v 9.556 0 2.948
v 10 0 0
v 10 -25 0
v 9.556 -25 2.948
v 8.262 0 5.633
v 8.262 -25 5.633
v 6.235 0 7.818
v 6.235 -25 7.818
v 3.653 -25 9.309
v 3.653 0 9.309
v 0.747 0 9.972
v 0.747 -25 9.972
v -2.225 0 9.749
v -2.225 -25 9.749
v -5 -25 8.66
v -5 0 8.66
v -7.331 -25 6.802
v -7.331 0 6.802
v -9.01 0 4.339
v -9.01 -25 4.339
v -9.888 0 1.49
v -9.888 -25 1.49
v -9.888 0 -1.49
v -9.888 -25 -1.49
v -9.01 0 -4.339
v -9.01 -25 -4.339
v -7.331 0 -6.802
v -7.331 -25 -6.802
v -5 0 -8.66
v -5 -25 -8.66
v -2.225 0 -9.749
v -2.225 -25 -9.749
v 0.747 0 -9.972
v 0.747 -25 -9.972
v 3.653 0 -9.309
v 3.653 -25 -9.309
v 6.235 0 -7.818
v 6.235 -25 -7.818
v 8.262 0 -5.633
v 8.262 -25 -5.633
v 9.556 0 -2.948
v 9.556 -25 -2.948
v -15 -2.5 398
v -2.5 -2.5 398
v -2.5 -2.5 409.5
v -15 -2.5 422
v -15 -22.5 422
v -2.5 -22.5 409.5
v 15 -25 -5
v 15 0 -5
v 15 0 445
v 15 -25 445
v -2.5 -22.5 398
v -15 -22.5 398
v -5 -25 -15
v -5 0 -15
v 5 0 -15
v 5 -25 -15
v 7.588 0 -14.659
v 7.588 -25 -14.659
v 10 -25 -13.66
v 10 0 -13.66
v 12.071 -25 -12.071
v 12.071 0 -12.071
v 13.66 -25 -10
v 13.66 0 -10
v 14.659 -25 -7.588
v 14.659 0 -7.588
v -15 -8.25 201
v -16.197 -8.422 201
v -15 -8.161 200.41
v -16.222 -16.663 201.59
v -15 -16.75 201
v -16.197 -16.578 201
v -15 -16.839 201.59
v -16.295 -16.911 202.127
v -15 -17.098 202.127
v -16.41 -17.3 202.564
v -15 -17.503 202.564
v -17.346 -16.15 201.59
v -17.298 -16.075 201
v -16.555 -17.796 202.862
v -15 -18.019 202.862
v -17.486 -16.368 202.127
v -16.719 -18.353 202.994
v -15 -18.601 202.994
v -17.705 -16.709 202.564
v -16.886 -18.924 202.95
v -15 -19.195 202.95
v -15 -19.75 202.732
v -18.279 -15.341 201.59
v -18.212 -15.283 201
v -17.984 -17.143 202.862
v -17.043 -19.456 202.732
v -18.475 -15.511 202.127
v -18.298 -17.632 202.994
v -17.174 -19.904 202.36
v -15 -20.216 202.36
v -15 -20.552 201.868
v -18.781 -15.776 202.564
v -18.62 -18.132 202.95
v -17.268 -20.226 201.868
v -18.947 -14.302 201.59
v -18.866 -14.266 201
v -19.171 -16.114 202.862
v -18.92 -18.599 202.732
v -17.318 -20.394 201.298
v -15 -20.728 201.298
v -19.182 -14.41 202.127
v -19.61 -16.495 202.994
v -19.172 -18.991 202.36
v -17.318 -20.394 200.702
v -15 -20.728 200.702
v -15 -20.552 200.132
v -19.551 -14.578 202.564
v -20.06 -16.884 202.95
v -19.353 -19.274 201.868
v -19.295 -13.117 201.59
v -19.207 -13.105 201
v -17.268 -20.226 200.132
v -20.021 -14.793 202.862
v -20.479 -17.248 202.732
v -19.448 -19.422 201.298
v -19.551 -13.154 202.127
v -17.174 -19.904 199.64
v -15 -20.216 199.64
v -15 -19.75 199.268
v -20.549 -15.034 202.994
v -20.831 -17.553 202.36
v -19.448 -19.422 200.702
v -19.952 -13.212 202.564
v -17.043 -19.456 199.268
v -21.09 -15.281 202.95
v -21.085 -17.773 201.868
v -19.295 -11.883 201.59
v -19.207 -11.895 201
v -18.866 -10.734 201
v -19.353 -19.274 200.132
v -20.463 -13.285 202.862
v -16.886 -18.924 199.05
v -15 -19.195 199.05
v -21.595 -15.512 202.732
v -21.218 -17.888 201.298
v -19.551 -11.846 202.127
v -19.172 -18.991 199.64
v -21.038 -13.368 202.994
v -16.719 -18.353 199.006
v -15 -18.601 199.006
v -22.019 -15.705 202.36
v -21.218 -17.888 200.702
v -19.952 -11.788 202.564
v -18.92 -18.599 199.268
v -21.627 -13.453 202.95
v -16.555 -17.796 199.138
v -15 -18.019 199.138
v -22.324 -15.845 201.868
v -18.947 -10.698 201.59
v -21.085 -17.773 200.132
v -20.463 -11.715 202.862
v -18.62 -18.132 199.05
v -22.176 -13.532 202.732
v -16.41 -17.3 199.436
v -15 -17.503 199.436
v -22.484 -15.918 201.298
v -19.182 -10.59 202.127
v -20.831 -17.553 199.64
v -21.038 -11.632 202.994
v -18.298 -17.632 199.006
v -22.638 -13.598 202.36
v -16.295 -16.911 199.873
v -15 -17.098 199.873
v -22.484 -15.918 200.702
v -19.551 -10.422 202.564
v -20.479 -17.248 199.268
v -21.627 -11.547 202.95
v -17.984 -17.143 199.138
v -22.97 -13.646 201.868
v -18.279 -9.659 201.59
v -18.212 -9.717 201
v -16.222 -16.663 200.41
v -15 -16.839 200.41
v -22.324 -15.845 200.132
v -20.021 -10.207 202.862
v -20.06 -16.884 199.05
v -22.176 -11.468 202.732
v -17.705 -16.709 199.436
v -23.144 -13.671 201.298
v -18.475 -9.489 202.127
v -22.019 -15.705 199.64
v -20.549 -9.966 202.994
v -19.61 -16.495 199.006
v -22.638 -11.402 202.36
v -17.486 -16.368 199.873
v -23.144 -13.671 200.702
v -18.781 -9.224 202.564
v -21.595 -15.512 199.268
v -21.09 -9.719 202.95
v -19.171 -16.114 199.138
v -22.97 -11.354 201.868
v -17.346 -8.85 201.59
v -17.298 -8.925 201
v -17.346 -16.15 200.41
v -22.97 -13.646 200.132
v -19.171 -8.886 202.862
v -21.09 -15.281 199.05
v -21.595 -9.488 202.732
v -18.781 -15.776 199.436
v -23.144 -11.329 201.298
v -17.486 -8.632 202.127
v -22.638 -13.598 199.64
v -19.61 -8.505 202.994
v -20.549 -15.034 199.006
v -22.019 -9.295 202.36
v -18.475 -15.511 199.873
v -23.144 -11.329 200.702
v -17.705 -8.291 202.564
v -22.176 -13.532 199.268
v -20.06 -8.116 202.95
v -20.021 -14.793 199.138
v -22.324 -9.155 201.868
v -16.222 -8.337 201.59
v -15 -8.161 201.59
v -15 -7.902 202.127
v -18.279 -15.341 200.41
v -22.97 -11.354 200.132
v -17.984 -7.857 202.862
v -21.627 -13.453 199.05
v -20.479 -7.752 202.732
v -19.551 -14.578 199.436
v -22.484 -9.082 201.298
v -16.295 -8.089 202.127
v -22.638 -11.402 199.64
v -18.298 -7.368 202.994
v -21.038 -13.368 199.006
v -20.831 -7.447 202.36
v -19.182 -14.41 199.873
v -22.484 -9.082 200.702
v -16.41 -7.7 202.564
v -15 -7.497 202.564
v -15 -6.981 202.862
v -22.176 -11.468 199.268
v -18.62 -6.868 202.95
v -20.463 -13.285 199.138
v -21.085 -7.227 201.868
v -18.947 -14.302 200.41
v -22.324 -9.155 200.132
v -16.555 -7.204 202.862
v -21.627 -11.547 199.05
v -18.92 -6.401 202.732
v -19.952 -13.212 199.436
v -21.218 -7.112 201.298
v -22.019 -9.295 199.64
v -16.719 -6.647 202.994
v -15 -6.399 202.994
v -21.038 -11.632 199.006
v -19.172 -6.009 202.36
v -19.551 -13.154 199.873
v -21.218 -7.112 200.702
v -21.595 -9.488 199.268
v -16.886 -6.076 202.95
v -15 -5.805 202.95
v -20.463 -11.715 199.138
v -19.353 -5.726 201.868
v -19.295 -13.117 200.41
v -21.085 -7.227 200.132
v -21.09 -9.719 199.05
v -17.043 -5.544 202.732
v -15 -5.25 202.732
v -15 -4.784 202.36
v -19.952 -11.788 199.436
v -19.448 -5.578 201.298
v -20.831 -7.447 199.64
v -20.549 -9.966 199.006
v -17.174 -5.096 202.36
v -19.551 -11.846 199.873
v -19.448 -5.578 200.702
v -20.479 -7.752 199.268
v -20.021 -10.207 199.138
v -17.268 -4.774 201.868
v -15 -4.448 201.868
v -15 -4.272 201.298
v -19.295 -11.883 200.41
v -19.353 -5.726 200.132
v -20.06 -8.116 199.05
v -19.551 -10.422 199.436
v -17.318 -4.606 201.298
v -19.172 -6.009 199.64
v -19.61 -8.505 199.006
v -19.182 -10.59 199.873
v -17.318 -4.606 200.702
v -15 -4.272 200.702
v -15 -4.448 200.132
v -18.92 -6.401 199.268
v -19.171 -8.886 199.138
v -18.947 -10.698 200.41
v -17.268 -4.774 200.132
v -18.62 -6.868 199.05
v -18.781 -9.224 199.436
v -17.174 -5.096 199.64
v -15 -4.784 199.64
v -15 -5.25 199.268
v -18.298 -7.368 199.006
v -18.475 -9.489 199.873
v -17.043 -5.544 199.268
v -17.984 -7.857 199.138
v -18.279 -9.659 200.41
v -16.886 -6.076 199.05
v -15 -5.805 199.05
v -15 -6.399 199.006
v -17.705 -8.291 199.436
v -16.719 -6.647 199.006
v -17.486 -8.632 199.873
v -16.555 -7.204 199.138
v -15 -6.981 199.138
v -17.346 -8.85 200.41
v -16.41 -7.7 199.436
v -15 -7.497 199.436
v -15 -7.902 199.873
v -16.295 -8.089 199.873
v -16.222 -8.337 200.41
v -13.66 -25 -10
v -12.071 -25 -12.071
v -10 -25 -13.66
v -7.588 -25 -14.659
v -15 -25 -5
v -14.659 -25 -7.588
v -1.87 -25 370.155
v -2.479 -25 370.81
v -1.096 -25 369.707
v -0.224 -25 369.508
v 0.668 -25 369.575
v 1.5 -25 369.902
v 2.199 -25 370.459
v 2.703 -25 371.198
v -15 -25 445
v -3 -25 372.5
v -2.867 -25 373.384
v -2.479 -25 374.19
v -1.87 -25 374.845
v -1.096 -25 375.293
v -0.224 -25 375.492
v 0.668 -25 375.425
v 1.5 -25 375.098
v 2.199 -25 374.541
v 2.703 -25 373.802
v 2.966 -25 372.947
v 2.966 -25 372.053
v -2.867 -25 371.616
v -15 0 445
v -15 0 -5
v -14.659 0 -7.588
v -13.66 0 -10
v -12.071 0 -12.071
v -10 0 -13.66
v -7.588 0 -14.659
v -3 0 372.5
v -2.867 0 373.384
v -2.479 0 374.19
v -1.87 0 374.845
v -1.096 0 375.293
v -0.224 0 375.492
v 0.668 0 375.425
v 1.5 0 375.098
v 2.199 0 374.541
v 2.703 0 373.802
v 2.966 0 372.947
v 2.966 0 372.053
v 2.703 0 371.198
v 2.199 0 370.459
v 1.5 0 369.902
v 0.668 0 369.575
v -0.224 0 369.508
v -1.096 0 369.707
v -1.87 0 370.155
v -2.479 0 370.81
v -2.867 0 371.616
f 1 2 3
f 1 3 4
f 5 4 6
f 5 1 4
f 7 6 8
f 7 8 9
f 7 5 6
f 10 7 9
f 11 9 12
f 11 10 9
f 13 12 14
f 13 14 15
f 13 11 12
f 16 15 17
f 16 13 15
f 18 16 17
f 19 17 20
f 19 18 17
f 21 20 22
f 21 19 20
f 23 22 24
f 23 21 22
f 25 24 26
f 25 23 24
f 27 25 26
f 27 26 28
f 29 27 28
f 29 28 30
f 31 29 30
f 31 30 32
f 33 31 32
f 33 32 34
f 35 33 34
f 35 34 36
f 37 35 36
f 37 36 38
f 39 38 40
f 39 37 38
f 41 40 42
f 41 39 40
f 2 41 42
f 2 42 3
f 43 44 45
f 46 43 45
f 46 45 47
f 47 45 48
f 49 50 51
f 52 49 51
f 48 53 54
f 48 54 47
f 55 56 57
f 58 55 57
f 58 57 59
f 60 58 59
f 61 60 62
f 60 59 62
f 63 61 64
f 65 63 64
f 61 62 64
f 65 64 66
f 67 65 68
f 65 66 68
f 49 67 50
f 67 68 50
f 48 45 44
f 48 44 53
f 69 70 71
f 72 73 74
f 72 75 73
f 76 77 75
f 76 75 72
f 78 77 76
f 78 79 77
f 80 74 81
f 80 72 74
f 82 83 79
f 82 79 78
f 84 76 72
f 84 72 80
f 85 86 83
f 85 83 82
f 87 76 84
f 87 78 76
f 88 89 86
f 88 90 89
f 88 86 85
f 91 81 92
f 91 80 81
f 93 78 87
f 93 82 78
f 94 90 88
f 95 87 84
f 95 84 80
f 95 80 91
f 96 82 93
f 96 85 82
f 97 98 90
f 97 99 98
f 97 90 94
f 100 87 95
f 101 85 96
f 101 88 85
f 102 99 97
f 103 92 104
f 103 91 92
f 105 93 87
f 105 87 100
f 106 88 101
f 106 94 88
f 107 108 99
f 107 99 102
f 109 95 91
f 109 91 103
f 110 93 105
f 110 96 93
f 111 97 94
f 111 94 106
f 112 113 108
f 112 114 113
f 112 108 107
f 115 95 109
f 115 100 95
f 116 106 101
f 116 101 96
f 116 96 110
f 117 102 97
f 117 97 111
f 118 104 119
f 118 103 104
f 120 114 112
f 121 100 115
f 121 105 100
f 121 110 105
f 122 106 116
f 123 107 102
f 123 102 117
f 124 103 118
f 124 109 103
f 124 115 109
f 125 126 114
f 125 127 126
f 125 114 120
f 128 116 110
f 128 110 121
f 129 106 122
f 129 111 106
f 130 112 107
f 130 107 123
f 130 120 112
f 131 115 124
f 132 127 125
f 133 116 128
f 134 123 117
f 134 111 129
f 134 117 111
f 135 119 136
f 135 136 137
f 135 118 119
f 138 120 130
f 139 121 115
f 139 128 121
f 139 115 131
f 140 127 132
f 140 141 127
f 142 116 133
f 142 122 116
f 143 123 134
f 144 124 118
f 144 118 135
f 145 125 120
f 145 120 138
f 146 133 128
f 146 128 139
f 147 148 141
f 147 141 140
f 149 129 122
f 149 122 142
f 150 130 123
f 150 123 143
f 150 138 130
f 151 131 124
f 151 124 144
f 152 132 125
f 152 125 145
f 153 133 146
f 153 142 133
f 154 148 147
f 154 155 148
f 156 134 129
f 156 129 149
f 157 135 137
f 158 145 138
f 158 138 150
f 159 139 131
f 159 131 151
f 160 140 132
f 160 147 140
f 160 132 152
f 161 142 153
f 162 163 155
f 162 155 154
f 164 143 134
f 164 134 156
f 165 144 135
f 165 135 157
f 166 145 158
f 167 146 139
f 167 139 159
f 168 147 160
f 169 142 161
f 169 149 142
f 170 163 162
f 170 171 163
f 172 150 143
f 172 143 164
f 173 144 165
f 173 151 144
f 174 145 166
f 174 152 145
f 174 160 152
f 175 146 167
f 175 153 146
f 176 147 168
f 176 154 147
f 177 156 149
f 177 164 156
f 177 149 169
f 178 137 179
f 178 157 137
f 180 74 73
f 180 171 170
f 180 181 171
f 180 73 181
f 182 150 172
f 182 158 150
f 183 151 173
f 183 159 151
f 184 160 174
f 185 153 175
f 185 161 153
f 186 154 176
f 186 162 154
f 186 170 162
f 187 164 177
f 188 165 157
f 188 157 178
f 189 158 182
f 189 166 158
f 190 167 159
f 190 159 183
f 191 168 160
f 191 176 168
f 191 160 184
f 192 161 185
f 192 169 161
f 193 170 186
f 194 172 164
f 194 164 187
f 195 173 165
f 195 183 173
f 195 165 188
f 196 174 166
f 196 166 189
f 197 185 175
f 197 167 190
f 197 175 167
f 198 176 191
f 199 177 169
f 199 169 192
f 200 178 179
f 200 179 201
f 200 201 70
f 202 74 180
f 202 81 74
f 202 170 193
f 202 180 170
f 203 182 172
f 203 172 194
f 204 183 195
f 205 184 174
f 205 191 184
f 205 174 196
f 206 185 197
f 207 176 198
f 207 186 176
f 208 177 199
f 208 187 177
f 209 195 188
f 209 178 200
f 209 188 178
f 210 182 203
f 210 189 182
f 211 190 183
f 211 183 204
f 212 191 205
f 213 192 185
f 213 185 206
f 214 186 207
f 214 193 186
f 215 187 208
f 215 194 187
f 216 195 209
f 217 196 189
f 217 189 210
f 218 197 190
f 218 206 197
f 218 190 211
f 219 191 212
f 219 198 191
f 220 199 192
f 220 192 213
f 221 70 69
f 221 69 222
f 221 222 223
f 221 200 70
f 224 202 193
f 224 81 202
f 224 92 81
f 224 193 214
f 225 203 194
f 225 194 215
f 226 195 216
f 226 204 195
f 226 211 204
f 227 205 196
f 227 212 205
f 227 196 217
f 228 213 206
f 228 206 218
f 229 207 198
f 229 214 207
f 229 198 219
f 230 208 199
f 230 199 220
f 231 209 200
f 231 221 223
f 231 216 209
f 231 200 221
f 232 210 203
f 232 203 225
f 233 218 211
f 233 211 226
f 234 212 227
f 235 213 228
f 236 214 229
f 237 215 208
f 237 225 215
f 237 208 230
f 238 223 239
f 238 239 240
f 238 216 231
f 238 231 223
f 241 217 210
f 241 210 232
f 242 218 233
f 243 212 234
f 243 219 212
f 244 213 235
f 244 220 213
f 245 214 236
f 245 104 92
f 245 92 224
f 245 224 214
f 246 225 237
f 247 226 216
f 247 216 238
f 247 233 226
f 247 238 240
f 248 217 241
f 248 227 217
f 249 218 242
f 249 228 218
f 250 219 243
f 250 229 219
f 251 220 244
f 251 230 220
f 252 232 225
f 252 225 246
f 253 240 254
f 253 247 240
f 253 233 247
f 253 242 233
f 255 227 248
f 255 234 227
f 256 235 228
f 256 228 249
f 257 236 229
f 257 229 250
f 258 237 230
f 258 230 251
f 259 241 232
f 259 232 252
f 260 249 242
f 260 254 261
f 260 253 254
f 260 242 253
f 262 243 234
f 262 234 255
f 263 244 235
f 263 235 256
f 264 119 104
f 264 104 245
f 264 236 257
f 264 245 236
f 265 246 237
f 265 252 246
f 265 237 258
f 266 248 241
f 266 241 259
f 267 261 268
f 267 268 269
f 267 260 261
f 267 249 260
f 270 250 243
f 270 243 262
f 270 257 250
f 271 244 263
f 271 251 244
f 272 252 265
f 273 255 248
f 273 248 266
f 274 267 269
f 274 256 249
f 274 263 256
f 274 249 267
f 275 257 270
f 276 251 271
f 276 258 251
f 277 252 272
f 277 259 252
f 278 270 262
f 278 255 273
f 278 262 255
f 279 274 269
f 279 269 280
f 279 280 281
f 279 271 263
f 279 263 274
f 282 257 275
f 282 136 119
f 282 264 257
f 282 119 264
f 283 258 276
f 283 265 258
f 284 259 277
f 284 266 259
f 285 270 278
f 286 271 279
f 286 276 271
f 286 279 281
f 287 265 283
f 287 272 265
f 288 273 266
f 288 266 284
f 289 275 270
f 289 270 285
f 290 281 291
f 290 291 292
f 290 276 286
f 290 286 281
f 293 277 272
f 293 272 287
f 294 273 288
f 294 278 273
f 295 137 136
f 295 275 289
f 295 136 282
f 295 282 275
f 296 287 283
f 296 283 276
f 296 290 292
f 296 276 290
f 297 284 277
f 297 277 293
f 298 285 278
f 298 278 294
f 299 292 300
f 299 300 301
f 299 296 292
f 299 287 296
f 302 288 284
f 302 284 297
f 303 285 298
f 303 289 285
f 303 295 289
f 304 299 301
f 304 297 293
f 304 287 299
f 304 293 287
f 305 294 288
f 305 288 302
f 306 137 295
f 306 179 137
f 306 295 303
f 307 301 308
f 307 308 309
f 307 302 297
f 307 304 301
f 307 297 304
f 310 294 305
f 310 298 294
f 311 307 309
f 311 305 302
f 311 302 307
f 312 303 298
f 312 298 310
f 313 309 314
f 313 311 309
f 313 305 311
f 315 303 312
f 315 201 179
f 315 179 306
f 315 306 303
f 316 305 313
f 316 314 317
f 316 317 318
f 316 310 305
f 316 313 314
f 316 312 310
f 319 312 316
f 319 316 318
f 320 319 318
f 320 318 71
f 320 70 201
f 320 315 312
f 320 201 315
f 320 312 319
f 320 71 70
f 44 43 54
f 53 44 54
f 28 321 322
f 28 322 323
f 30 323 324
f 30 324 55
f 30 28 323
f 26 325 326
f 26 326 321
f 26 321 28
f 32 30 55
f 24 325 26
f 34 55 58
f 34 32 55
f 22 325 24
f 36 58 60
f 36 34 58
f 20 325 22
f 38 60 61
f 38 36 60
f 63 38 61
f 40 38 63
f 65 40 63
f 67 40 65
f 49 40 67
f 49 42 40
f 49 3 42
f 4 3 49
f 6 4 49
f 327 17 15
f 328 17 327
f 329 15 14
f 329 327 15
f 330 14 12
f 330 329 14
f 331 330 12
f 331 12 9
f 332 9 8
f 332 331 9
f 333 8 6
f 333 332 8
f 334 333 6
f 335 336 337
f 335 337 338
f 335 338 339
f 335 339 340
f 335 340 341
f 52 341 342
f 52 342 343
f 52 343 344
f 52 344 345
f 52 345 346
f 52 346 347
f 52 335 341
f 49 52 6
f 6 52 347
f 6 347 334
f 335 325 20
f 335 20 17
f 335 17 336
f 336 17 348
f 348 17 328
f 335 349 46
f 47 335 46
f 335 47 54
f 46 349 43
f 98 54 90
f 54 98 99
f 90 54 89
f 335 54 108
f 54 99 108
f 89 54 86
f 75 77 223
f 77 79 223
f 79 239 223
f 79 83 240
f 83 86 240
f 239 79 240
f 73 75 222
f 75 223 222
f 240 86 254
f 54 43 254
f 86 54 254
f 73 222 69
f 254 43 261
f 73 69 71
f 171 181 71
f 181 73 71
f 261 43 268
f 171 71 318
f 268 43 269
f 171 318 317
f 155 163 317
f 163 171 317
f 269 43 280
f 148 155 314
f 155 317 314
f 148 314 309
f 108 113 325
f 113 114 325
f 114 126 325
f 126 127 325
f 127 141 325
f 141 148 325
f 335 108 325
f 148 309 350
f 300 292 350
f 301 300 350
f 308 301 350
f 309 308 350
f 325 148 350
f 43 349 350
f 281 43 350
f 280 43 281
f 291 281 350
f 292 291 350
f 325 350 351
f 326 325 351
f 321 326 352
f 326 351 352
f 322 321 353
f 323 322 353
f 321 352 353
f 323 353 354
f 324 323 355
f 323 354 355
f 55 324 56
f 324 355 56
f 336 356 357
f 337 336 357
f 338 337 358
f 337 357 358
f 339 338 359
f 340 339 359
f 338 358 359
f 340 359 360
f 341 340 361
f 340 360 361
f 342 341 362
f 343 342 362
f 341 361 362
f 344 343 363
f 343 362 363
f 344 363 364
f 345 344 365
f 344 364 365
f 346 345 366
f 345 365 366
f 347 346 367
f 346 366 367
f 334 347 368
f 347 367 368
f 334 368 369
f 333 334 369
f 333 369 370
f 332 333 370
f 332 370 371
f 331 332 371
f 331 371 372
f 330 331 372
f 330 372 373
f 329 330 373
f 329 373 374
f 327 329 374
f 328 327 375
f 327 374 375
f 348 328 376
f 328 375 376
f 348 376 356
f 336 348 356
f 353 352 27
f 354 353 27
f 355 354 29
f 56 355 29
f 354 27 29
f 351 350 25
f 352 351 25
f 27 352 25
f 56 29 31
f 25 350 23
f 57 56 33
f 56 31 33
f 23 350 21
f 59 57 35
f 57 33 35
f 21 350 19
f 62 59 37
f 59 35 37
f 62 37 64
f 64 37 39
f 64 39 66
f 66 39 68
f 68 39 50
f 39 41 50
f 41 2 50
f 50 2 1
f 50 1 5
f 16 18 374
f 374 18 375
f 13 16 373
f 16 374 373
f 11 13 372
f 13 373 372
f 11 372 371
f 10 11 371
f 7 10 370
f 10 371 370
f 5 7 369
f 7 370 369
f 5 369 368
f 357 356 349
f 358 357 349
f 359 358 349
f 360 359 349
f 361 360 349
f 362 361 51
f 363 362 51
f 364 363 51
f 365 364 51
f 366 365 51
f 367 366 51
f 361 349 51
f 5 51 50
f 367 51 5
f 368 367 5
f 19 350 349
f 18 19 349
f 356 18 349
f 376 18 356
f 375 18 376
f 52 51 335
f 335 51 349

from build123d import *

# Parameters (mm, degrees)
F0_R      = 10
F1_DEPTH  = 25
F2_W      = 20
F2_H      = 24
F3_DEPTH  = 12.5
F4_SIZE   = 12.49999
F5_R      = 2
F9_R      = 3
F10_DEPTH = 25


# Not quite as in the source:
# - a fillet or chamfer is up to 0.001 mm smaller than in the source, because OpenCascade refuses the exact size


with BuildPart() as f1:
    # F0 (on Front) → F1 (new body)
    with BuildSketch(Plane.XZ):
        with BuildLine():
            ThreePointArc((-15, -5), (-12.0710678119, -12.0710678119), (-5, -15))
            Line((-5, -15), (5, -15))
            ThreePointArc((5, -15), (12.0710678119, -12.0710678119), (15, -5))
            Line((15, -5), (15, 15))
            Line((15, 15), (15, 445))
            Line((15, 445), (-15, 445))
            Line((-15, 445), (-15, 15))
            Line((-15, 15), (-15, -5))
        make_face()
        Circle(F0_R, mode=Mode.SUBTRACT)
    extrude(amount=F1_DEPTH)

    # F2 (on face) → F3 (cut)
    with BuildSketch(Plane(origin=(-15, 0, 0), x_dir=(0, -1, 0), z_dir=(-1, 0, 0))):
        with Locations((12.5, 410)):
            Rectangle(F2_W, F2_H)
    extrude(amount=-F3_DEPTH, mode=Mode.SUBTRACT)

    # F4 (size 12.5 in the source; OpenCascade refuses exactly that, so slightly less here)
    f4_edges = [f1.edges().sort_by_distance(p)[0] for p in [
        (-2.5, -12.5, 422),
    ]]
    chamfer(f4_edges, length=F4_SIZE)

    # F8: sweep along a path in F7
    with BuildLine(Plane.XY.offset(201)) as f8_path:
        ThreePointArc((-15, -18.75), (-21.25, -12.5), (-15, -6.25))
    # F5 (on face) → F8 (sweep)
    with BuildSketch(Plane(origin=(-15, 0, 0), x_dir=(0, -1, 0), z_dir=(-1, 0, 0))):
        with Locations((6.25, 201)):
            Circle(F5_R)
    sweep(path=f8_path.line)

    # F9 (on face) → F10 (cut, through all)
    with BuildSketch(Plane(origin=(0, 0, 0), x_dir=(-1, 0, 0), z_dir=(0, 1, 0))):
        with Locations((0, 372.5)):
            Circle(F9_R)
    extrude(amount=-F10_DEPTH, mode=Mode.SUBTRACT)


solid = f1.part
